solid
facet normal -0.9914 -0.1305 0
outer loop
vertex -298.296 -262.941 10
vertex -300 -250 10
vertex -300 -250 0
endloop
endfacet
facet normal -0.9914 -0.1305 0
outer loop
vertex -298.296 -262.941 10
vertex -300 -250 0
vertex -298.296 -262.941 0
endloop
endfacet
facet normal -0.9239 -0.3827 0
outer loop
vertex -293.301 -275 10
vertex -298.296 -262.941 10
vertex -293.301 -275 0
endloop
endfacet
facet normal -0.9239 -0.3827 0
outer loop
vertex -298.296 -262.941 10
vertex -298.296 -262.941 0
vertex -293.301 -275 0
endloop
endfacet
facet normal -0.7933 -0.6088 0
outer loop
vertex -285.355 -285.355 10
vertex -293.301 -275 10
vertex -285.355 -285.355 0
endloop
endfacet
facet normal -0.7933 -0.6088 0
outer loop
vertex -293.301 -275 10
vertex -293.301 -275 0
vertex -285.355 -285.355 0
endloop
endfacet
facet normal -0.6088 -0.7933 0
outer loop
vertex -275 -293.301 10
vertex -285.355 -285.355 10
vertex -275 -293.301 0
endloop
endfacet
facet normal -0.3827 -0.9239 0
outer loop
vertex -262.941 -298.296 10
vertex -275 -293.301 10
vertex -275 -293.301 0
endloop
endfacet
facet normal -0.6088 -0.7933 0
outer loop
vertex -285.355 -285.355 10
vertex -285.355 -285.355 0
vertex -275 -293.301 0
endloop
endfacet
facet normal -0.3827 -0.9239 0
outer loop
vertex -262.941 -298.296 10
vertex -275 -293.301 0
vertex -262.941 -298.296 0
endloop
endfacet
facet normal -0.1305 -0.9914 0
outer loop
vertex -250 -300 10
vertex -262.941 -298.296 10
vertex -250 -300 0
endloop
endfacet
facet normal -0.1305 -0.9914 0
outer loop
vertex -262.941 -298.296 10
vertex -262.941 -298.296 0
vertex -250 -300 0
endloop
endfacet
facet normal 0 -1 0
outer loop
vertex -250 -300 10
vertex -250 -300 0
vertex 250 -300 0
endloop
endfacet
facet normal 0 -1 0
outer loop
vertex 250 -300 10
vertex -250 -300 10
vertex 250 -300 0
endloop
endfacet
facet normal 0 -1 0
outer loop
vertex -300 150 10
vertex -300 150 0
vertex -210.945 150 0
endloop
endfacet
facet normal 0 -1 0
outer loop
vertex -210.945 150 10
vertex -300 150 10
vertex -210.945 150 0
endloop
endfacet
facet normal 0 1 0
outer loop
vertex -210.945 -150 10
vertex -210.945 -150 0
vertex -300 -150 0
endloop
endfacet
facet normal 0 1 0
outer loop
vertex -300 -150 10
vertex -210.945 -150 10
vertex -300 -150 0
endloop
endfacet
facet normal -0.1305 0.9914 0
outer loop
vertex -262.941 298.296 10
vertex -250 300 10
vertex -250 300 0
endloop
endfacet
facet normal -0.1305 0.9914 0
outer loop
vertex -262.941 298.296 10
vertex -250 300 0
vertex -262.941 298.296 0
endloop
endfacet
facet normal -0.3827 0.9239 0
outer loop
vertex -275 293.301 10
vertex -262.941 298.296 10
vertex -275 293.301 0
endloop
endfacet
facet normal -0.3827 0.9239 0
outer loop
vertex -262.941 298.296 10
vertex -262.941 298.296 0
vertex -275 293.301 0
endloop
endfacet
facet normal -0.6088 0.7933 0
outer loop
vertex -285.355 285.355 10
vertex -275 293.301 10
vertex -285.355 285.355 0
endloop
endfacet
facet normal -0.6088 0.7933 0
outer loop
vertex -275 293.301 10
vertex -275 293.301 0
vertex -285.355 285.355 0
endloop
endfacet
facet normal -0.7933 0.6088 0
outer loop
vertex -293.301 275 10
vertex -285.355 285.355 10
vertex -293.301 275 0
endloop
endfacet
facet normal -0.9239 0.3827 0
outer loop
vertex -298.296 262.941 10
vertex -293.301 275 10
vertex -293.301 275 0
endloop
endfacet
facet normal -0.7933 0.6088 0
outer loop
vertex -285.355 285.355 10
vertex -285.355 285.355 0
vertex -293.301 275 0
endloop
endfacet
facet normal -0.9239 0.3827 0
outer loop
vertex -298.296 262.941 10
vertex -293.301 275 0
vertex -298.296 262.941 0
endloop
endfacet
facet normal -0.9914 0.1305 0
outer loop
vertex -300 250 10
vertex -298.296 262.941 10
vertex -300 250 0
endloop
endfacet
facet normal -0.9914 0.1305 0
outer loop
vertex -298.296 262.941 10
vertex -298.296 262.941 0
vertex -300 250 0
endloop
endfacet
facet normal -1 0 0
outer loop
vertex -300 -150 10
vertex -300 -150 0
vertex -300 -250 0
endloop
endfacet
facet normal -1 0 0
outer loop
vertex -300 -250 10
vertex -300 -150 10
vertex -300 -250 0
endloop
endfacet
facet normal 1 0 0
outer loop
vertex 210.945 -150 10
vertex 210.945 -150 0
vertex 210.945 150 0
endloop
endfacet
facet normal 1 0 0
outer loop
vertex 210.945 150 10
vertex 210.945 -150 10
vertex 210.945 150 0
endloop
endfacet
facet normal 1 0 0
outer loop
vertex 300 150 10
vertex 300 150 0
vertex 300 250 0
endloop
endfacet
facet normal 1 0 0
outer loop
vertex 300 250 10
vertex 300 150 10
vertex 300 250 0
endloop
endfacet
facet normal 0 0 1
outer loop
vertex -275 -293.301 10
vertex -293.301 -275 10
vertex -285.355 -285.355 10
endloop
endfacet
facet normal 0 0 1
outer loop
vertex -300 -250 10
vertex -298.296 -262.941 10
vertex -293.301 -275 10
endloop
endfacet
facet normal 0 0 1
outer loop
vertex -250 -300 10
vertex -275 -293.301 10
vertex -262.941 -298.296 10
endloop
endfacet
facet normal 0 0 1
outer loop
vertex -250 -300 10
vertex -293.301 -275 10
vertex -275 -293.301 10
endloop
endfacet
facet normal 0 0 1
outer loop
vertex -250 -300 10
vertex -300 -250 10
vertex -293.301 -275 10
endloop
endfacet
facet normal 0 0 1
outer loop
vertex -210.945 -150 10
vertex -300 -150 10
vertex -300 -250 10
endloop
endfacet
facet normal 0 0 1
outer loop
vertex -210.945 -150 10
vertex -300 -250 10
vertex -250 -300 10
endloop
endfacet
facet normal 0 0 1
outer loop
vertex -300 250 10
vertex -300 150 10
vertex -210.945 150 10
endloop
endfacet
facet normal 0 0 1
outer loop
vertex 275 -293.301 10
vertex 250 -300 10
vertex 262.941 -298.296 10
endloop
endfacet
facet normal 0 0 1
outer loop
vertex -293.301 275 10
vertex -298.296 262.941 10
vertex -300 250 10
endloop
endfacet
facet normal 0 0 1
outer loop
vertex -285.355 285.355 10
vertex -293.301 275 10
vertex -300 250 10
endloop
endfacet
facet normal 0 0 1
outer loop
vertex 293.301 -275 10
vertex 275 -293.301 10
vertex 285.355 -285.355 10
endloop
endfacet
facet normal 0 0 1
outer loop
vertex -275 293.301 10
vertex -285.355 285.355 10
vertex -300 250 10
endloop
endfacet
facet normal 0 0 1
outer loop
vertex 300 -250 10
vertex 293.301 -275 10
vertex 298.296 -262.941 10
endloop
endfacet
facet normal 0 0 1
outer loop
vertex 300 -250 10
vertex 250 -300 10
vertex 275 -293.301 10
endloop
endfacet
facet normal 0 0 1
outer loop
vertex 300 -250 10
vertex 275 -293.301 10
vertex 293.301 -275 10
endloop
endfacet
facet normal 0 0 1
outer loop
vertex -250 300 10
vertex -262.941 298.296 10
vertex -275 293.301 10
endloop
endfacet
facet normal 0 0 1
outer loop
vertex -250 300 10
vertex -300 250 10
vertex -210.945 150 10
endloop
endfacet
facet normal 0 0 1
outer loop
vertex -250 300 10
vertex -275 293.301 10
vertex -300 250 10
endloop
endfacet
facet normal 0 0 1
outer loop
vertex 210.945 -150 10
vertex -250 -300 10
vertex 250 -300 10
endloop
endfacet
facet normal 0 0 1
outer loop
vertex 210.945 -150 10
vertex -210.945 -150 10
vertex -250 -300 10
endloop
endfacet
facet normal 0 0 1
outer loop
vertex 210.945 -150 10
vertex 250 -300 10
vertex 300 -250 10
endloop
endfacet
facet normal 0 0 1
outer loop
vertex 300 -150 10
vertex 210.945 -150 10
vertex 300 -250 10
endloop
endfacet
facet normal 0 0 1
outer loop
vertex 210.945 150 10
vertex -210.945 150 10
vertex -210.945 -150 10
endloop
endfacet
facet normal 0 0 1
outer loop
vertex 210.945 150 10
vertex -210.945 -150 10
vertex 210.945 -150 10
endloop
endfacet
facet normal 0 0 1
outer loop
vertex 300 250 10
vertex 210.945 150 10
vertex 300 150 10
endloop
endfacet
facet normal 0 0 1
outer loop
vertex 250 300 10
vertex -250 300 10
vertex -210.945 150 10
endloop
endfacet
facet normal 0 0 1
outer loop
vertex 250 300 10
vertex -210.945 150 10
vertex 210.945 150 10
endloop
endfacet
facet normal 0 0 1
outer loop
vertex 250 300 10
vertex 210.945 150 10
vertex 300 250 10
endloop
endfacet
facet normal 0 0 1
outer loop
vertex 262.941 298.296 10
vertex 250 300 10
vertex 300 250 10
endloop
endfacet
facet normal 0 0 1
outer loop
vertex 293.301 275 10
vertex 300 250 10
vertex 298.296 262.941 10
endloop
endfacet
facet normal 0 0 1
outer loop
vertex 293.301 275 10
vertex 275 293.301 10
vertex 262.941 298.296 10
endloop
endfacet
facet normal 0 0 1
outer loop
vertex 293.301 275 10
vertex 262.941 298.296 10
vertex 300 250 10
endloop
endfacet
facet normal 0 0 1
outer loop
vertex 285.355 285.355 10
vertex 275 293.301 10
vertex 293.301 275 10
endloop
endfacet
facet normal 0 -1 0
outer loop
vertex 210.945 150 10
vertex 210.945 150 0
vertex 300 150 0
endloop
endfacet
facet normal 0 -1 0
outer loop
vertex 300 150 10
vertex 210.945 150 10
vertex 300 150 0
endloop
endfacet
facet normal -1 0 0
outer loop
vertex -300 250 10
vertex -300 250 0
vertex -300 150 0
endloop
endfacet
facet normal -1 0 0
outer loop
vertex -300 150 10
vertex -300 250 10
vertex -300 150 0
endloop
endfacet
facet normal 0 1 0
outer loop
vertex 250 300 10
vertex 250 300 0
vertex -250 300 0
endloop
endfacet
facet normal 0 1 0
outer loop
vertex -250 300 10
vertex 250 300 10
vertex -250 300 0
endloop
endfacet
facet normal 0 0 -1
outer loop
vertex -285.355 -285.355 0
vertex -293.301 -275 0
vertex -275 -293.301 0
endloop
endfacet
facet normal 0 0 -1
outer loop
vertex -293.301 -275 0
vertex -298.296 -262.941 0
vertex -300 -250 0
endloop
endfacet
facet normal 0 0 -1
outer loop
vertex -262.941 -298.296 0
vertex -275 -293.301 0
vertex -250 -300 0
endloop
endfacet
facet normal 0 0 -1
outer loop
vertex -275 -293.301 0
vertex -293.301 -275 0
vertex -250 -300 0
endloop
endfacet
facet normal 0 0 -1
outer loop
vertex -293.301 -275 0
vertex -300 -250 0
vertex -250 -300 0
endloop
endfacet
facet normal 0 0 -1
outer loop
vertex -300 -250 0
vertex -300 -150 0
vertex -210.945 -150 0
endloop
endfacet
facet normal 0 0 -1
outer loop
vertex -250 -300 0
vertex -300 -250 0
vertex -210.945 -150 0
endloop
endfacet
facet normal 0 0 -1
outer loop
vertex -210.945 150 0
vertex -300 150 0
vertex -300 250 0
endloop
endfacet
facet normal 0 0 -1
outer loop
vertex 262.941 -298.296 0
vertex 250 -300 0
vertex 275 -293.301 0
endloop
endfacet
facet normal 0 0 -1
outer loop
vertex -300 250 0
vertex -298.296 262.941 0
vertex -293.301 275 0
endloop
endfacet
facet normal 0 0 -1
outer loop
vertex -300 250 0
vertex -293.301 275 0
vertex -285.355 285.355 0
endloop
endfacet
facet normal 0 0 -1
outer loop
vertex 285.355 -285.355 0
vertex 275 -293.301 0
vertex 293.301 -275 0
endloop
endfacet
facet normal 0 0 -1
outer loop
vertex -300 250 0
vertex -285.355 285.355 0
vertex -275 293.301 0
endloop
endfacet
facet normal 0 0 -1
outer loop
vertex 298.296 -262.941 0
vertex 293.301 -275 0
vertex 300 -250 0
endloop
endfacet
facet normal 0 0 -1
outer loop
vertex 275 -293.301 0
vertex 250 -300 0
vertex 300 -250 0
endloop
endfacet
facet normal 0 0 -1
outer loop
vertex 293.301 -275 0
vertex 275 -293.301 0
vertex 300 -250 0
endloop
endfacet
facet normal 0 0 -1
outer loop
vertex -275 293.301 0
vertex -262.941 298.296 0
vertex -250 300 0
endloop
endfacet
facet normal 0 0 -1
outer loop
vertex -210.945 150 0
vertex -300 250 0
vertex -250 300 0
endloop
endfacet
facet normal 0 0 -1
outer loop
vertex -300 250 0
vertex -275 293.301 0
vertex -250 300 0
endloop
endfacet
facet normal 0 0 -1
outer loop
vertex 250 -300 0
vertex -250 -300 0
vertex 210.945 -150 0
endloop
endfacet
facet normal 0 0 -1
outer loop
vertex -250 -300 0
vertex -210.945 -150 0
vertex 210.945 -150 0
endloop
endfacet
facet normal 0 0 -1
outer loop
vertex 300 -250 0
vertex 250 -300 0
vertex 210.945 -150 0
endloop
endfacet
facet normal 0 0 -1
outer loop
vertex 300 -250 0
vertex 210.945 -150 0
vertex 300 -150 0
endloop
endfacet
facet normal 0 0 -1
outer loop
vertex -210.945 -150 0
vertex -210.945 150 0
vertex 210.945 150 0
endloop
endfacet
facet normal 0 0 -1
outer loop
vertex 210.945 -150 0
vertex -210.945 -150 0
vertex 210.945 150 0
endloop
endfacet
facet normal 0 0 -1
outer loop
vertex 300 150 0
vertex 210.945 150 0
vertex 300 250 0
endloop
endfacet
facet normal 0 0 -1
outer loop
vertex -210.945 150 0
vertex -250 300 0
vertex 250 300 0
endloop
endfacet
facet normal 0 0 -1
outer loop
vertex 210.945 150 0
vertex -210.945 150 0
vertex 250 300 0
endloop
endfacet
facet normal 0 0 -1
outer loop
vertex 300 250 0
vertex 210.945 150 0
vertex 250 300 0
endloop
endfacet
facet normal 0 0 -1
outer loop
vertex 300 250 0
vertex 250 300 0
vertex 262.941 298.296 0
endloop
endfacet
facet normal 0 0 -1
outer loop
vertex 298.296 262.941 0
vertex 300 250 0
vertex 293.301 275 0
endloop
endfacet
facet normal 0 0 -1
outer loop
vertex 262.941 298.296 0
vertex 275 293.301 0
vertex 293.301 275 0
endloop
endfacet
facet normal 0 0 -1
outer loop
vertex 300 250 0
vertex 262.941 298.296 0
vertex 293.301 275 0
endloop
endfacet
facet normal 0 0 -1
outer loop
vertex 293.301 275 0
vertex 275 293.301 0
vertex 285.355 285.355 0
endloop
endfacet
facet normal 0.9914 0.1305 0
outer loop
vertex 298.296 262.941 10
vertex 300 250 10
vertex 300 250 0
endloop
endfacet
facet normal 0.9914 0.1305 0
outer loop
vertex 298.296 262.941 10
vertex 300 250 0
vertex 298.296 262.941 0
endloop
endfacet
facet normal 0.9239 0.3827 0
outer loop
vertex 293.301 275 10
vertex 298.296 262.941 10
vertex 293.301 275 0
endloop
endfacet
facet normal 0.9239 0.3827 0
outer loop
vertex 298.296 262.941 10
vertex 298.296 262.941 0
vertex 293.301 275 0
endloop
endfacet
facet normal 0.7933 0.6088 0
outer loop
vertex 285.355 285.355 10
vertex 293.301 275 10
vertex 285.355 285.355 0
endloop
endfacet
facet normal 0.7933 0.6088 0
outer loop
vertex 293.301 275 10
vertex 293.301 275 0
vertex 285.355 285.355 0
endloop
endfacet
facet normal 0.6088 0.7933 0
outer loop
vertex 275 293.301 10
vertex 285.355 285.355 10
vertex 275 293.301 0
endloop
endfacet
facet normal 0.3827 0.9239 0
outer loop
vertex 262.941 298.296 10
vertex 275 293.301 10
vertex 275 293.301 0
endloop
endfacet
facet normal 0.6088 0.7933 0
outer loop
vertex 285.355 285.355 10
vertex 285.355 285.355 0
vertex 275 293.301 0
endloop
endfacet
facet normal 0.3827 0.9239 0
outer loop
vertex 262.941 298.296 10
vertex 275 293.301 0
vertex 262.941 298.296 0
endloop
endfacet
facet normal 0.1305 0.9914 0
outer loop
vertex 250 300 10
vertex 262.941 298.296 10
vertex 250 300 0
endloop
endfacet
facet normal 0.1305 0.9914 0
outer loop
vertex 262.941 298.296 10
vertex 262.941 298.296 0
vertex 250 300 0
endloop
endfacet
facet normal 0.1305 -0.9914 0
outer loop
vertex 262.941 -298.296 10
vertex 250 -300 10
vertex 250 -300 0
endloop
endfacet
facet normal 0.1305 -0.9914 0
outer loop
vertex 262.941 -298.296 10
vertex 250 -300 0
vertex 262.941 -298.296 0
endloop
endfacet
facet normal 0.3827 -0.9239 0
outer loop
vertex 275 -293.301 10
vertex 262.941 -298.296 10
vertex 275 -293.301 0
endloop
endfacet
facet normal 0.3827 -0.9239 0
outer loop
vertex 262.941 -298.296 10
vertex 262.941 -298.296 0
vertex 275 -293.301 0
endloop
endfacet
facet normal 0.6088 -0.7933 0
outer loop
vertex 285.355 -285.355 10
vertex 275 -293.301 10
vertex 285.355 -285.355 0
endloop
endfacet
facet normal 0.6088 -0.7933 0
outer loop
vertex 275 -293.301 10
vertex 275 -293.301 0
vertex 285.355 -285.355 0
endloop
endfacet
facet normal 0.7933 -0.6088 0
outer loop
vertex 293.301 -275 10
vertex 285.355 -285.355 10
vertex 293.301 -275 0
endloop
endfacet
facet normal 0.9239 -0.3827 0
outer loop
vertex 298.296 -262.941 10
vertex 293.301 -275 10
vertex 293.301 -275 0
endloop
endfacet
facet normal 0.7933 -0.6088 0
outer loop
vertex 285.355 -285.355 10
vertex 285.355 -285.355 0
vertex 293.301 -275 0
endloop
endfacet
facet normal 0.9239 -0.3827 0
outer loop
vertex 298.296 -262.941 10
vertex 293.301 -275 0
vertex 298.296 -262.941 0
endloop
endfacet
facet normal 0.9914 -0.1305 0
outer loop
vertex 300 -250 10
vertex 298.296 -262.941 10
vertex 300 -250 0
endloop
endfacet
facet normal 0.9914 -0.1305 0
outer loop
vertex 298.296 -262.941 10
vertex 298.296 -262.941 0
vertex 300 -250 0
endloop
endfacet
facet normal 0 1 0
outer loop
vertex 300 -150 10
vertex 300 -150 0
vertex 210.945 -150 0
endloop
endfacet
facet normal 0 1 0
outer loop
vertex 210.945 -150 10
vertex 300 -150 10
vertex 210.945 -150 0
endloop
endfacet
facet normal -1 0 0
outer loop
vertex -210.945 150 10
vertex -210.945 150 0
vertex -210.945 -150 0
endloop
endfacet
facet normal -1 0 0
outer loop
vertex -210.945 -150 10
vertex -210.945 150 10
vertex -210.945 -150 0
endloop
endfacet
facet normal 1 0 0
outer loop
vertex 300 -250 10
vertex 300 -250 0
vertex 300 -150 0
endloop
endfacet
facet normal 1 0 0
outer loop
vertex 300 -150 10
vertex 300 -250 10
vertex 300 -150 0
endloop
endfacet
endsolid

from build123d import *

# Parameters (mm, degrees)
F1_DEPTH = 10


with BuildPart() as f1:
    # F0 (on Top) → F1 (new body)
    with BuildSketch(Plane.XY):
        with BuildLine():
            ThreePointArc((300, 250), (285.355339, 285.355339), (250, 300))
            Line((250, 300), (-250, 300))
            ThreePointArc((-250, 300), (-285.355339, 285.355339), (-300, 250))
            Line((-300, 250), (-300, 150))
            Line((-300, 150), (-210.945189, 150))
            Line((-210.945189, 150), (-210.945189, -150))
            Line((-210.945189, -150), (-300, -150))
            Line((-300, -150), (-300, -250))
            ThreePointArc((-300, -250), (-285.355339, -285.355339), (-250, -300))
            Line((-250, -300), (250, -300))
            ThreePointArc((250, -300), (285.355339, -285.355339), (300, -250))
            Line((300, -250), (300, -150))
            Line((300, -150), (210.945189, -150))
            Line((210.945189, -150), (210.945189, 150))
            Line((210.945189, 150), (300, 150))
            Line((300, 150), (300, 250))
        make_face()
    extrude(amount=F1_DEPTH)


solid = f1.part
